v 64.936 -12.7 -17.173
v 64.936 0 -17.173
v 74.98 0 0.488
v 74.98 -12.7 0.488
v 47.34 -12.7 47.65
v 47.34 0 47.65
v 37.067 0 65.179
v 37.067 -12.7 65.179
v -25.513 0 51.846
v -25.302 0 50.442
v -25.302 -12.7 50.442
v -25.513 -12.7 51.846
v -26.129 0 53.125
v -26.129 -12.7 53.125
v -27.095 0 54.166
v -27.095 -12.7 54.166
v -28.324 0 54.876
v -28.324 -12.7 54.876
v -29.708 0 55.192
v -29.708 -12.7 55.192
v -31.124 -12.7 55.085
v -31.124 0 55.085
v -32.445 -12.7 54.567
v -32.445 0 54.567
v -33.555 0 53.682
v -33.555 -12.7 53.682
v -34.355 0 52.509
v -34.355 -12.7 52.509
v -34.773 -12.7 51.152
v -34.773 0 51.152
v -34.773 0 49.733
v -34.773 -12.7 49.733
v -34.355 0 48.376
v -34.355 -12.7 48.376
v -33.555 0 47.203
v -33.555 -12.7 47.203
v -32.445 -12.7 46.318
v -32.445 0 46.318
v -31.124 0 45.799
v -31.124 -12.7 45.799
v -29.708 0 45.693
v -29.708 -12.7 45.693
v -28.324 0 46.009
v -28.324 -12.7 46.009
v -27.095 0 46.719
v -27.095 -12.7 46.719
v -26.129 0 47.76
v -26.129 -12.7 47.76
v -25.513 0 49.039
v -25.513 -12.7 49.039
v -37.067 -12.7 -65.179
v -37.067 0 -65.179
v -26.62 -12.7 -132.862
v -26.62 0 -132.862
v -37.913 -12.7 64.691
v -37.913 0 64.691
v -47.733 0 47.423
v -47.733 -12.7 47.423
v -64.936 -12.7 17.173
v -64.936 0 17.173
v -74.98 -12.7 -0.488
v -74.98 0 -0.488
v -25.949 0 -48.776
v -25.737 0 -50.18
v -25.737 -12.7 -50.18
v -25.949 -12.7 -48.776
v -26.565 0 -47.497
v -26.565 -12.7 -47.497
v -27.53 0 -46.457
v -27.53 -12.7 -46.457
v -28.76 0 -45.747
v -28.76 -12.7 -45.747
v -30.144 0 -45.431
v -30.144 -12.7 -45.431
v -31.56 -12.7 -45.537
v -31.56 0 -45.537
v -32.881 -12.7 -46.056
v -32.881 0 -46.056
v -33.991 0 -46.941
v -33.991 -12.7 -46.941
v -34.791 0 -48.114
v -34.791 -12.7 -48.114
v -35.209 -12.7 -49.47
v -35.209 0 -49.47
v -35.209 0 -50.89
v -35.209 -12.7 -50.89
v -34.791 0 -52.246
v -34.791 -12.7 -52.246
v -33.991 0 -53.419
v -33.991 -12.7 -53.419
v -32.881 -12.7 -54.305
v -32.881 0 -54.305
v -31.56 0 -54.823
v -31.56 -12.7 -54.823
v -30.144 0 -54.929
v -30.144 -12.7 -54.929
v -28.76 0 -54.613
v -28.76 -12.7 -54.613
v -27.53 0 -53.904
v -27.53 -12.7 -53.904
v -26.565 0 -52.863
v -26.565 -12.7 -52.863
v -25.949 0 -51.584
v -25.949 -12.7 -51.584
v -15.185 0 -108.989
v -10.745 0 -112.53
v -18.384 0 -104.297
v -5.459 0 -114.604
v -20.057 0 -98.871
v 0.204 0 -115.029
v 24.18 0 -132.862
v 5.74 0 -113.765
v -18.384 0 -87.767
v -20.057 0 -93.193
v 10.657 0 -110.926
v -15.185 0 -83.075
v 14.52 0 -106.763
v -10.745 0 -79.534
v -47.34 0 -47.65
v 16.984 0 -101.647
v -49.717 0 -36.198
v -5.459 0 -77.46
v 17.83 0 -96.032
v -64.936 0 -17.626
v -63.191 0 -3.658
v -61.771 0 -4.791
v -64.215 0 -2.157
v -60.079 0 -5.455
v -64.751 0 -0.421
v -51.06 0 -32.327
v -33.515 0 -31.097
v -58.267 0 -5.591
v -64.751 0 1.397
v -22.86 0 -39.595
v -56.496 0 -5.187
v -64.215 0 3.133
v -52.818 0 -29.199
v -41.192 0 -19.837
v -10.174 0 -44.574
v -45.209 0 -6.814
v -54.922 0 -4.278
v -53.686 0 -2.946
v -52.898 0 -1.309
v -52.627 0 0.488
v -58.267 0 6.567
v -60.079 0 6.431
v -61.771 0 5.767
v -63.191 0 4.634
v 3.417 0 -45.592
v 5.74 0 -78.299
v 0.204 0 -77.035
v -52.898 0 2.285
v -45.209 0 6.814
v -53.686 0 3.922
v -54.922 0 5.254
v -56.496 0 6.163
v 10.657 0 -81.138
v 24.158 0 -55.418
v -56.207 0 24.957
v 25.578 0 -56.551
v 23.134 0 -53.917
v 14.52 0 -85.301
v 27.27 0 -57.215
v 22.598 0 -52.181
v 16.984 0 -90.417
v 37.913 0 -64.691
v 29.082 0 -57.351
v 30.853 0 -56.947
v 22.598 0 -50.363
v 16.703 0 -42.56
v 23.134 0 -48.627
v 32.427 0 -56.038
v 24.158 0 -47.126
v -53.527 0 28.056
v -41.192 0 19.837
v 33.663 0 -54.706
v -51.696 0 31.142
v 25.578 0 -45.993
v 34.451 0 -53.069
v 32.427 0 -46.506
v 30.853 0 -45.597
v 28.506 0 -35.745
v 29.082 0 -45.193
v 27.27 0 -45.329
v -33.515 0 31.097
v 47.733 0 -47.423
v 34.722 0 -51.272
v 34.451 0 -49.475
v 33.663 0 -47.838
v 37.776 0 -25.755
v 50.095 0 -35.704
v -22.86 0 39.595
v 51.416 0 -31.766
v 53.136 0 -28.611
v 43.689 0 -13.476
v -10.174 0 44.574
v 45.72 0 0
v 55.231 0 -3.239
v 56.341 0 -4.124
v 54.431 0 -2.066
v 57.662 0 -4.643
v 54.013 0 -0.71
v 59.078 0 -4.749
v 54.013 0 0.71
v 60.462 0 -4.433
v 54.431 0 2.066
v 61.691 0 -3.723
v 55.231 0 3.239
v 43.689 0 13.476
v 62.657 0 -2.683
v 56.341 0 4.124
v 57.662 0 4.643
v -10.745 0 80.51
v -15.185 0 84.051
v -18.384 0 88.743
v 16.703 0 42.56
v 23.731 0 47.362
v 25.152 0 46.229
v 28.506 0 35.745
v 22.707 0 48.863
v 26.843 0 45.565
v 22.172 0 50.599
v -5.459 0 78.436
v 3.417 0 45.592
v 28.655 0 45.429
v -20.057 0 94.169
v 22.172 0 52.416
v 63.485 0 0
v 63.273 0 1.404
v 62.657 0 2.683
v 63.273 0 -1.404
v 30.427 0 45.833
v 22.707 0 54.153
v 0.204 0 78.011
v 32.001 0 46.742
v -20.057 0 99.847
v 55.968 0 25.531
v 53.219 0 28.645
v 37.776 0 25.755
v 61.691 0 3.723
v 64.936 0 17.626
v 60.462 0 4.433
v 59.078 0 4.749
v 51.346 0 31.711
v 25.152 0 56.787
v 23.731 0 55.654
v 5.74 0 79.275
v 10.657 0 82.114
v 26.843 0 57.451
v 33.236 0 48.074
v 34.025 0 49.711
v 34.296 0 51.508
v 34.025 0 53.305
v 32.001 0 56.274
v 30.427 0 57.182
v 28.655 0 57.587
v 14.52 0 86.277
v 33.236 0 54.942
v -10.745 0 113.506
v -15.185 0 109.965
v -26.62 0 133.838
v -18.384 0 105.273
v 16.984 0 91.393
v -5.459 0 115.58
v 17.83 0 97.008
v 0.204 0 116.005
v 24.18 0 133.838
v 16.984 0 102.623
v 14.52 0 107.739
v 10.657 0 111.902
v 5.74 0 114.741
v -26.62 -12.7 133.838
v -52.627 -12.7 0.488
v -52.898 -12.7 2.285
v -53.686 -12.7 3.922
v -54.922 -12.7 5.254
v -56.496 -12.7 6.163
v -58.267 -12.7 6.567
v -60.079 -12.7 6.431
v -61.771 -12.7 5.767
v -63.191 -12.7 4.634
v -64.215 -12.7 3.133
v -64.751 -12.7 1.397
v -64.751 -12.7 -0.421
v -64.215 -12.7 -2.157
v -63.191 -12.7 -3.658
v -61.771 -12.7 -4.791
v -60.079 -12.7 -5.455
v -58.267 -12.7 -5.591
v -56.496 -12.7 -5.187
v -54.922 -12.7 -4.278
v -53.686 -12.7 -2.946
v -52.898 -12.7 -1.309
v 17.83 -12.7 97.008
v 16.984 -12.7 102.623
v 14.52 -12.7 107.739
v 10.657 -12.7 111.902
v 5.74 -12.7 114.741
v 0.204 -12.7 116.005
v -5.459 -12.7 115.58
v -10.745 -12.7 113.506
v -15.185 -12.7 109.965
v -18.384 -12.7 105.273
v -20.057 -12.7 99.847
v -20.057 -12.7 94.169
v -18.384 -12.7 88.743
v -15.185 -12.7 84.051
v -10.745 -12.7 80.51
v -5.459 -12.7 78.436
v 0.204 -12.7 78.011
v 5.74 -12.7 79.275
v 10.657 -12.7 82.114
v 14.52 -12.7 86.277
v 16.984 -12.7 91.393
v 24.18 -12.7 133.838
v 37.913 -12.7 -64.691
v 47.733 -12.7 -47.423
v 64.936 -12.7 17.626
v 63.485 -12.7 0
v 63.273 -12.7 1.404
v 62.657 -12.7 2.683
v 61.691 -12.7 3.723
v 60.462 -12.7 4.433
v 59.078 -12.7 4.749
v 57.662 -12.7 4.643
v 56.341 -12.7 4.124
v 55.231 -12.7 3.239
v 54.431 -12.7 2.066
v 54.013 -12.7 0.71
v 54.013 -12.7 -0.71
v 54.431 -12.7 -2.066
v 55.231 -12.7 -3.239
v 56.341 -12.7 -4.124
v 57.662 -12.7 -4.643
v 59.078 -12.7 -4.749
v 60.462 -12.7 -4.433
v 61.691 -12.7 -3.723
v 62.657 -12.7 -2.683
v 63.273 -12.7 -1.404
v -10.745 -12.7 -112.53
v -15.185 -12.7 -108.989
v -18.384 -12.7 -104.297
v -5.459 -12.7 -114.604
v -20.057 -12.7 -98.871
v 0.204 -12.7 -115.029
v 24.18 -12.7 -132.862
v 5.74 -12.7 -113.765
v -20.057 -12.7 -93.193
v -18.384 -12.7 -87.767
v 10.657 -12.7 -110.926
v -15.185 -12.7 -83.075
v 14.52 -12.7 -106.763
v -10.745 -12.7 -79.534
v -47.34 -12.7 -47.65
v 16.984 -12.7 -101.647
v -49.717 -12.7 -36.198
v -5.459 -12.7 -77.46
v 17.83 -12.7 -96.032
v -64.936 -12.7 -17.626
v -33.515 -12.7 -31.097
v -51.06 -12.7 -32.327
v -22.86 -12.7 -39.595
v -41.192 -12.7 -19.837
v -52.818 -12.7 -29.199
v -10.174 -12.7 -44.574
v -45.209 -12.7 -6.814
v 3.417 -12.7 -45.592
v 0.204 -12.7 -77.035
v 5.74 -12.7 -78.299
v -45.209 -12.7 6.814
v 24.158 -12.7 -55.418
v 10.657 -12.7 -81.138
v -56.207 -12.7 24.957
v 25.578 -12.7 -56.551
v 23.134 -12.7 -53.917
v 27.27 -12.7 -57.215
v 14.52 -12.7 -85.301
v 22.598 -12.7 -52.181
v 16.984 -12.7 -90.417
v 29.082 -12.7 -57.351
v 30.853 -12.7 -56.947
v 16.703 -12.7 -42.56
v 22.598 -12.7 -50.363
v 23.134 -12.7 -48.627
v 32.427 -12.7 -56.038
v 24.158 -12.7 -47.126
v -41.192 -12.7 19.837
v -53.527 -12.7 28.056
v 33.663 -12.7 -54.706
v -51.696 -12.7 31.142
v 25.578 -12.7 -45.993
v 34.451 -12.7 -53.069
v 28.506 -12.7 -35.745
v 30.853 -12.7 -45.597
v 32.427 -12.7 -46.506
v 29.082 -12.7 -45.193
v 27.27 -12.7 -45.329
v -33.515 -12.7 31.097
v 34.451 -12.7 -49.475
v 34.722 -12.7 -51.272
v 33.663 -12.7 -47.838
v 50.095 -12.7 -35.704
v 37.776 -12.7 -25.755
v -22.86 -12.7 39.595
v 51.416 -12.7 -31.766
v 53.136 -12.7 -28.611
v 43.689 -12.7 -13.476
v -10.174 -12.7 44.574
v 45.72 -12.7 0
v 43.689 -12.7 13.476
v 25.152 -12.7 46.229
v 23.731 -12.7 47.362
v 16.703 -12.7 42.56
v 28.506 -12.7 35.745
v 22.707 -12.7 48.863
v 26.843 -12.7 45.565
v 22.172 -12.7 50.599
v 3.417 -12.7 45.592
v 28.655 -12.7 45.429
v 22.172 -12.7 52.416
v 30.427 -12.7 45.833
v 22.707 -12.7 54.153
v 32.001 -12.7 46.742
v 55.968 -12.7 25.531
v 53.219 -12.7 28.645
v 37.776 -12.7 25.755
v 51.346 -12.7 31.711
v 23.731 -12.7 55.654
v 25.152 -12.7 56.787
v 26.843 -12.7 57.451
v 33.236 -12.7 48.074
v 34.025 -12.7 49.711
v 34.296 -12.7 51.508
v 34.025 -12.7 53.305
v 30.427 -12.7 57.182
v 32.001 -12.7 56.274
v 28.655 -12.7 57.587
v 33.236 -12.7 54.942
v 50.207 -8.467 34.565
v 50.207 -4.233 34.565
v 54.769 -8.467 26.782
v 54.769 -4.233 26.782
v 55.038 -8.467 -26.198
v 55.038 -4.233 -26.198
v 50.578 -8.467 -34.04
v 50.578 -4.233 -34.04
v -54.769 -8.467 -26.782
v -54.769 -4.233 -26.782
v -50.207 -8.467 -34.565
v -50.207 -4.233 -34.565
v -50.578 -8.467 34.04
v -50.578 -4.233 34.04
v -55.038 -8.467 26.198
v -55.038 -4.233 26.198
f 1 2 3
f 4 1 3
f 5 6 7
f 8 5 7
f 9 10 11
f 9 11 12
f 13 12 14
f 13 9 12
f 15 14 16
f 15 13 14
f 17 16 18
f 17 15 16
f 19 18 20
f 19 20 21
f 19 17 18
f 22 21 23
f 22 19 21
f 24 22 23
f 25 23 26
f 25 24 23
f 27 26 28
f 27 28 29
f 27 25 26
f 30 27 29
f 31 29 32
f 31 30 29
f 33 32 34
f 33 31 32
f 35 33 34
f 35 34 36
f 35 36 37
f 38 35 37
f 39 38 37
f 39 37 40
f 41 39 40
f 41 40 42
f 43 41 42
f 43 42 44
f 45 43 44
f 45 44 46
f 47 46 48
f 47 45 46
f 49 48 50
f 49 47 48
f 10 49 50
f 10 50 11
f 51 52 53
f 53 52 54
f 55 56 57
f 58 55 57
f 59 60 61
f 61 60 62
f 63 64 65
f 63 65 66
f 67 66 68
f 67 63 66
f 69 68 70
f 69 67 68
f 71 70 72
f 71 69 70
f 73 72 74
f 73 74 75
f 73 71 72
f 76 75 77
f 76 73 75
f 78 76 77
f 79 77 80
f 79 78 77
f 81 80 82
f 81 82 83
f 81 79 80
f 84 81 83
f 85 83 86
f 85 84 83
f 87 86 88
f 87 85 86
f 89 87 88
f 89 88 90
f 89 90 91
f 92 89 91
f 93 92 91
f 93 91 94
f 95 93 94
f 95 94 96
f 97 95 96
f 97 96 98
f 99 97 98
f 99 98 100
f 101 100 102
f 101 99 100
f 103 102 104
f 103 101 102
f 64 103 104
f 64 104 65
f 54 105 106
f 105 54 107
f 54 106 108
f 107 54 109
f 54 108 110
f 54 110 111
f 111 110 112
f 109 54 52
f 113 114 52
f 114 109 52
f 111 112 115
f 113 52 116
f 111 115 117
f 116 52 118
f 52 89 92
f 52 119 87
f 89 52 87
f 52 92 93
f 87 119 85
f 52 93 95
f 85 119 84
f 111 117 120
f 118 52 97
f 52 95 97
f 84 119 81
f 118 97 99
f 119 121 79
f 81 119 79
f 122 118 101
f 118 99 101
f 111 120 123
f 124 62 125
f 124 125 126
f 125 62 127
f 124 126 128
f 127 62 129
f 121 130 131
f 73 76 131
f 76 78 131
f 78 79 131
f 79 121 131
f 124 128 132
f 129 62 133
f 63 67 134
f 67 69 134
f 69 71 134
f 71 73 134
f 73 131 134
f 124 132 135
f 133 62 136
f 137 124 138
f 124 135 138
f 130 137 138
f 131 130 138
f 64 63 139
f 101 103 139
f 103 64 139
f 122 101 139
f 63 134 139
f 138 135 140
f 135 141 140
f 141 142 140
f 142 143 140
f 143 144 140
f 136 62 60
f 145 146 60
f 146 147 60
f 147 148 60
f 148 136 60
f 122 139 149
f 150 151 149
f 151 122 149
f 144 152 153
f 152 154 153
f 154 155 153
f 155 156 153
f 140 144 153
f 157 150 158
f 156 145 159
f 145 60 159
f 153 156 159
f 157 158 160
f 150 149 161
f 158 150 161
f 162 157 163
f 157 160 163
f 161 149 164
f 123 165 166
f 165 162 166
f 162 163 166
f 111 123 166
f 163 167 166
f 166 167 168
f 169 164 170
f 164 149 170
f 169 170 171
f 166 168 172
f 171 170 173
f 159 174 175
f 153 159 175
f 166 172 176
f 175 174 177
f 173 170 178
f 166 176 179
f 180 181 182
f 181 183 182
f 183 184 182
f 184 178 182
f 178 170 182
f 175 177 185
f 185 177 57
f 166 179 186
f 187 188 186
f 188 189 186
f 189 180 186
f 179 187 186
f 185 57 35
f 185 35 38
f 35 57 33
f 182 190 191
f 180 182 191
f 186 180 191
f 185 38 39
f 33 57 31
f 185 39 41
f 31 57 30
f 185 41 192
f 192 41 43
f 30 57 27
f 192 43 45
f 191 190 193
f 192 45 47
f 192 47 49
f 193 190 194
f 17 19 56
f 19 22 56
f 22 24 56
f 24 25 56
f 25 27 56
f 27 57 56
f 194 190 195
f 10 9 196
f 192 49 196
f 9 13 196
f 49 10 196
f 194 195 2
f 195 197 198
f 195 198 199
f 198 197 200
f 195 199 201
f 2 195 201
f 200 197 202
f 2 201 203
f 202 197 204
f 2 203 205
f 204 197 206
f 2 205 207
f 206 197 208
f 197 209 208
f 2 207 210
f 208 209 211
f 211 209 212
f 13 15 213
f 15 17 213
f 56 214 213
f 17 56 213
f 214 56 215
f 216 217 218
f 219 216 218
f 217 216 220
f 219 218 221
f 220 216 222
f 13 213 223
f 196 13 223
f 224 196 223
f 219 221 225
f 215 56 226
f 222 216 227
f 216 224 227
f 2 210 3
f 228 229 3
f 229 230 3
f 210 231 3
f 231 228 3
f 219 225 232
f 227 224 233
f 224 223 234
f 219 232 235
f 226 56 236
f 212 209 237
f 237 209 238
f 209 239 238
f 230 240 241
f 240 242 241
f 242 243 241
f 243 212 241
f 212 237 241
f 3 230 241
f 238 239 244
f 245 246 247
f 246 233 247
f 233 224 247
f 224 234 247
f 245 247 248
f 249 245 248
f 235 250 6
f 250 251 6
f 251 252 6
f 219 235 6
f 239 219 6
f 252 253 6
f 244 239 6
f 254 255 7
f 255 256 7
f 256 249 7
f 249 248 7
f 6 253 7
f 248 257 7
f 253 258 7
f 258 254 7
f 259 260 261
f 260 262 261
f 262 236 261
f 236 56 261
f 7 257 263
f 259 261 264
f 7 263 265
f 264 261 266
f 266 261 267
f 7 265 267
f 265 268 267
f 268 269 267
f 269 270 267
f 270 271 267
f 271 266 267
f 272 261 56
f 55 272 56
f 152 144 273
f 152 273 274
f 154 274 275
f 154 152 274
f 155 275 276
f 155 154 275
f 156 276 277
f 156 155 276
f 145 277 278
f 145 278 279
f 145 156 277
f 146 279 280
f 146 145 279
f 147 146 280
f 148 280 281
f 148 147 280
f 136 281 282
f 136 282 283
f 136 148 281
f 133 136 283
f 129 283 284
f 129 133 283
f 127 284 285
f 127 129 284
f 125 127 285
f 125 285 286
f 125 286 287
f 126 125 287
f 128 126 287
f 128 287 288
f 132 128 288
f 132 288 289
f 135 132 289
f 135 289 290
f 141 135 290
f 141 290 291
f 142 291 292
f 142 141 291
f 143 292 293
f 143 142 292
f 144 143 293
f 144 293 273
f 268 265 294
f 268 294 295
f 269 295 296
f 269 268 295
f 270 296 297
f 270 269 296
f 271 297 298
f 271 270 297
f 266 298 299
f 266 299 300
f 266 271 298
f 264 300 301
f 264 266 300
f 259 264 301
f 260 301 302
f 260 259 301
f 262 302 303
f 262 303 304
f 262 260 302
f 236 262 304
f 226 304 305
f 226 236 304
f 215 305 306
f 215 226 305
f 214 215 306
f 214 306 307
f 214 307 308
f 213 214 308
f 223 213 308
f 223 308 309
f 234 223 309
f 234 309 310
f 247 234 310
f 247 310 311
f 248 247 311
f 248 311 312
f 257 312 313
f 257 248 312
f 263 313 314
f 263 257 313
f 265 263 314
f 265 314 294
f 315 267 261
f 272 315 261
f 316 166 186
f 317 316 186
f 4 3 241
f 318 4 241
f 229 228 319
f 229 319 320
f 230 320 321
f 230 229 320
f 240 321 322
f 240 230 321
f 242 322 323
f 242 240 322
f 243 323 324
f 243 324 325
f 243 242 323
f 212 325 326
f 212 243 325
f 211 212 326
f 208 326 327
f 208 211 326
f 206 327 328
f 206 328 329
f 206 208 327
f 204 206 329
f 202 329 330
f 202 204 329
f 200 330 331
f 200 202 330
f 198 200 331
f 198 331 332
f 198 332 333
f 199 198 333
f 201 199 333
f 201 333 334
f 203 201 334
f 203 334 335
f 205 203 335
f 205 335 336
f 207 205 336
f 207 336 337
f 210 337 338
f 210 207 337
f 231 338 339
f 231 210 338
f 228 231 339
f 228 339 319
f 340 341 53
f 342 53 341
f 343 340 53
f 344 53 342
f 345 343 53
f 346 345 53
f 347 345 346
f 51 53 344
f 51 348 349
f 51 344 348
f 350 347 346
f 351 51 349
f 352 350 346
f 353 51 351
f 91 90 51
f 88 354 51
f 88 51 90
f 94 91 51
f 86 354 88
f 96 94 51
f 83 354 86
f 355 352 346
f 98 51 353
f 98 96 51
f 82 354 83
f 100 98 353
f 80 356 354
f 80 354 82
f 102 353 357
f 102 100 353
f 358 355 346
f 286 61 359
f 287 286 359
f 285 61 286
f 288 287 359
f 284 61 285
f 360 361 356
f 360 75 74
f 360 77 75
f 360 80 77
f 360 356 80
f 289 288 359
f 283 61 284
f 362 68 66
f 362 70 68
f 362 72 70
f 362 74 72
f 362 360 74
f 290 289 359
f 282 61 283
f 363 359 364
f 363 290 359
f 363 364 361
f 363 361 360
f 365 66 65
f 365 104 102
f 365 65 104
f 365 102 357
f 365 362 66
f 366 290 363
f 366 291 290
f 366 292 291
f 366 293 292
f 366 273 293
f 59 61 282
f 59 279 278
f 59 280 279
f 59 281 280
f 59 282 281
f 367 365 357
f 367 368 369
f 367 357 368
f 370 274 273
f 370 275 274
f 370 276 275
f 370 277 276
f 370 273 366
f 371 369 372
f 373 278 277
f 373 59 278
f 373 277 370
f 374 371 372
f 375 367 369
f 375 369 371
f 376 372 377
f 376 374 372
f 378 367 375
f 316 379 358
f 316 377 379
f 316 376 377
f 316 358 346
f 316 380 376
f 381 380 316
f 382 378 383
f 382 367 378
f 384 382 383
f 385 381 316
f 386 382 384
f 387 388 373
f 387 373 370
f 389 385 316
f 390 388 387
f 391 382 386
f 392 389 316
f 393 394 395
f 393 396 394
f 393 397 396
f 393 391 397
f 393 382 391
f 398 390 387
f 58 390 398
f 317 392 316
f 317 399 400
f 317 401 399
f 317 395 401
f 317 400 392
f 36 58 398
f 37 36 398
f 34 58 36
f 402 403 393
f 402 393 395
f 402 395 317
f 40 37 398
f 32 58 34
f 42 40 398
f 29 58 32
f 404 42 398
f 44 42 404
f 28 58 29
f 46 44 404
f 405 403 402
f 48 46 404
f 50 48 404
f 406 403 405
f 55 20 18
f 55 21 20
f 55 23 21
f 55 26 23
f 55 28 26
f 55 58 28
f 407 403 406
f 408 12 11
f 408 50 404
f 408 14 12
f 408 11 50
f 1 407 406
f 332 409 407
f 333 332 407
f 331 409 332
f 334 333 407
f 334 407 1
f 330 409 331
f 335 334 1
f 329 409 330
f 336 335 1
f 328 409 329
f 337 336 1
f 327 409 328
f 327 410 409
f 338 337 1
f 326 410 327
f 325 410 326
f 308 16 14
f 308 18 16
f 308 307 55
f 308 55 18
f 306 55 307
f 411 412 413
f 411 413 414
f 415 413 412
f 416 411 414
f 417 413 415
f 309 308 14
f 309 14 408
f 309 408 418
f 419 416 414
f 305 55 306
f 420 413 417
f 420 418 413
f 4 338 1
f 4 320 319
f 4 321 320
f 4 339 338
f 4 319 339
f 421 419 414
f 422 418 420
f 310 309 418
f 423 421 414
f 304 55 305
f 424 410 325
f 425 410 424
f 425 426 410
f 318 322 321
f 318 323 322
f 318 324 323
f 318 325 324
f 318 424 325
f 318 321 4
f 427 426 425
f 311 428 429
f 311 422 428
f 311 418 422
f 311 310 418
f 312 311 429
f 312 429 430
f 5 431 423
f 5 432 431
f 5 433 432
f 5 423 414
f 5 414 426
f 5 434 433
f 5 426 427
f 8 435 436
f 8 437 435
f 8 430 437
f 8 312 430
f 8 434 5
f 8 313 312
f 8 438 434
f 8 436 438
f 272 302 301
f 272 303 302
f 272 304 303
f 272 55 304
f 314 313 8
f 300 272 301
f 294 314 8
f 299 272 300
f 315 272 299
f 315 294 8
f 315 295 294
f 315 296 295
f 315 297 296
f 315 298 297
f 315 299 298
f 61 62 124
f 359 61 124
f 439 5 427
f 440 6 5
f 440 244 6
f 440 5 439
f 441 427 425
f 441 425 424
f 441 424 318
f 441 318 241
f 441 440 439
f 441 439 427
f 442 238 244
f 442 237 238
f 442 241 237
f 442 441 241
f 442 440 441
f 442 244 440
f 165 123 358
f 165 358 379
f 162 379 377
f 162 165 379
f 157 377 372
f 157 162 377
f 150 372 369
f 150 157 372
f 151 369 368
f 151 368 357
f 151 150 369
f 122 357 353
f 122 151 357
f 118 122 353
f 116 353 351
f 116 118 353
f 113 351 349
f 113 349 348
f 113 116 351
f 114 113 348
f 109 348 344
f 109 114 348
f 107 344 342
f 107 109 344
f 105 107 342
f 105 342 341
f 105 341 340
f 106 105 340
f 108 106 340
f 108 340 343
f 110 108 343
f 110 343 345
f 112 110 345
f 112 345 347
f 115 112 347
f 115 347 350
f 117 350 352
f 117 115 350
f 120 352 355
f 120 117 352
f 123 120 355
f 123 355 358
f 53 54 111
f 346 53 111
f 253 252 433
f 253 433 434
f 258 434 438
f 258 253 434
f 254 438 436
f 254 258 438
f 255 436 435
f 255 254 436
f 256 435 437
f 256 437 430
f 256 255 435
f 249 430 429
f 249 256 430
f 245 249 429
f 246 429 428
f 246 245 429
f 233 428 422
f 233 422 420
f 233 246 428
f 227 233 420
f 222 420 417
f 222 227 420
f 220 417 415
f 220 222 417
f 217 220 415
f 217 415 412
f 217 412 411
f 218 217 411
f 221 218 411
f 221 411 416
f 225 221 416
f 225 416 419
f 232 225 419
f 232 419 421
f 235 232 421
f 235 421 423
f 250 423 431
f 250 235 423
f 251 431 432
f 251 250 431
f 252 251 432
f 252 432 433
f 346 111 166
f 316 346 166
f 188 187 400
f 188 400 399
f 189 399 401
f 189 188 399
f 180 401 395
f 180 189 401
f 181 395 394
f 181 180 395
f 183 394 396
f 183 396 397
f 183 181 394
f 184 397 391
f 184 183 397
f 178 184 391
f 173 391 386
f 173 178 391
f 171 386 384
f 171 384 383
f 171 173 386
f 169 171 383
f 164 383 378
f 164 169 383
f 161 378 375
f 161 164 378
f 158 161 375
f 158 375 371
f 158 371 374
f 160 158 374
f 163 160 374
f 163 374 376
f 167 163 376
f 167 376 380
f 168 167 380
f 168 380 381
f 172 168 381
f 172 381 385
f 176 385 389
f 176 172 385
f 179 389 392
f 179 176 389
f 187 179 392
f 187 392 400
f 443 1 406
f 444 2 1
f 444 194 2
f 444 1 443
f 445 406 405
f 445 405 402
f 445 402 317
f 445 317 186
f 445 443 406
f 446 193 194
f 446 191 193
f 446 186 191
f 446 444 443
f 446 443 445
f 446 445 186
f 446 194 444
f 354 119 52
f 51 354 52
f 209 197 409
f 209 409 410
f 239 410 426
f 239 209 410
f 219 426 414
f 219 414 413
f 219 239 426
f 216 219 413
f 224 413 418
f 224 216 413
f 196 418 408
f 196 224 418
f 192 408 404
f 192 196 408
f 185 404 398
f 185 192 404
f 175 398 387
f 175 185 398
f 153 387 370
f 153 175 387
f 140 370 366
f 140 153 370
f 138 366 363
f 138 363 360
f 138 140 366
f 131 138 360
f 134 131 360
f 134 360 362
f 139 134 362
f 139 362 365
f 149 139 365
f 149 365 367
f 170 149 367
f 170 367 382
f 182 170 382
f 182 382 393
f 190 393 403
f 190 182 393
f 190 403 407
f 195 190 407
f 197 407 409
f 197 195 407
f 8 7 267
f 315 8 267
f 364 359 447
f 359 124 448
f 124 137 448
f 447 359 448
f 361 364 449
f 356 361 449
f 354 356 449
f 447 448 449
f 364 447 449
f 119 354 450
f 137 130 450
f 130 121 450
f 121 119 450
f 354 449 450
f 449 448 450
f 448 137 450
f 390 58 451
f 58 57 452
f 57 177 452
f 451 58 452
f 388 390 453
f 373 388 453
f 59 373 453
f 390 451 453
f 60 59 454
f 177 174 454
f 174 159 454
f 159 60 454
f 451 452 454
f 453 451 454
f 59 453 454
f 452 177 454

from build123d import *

# Parameters (mm, degrees)
F0_R     = 19.05
F0_R_2   = 4.7625
F0_R_3   = 6.096
F0_R_4   = 45.72
F1_DEPTH = 12.7


# Not quite as in the source:
# - ends of sketch curves that miss each other by under 0.0002 mm in the source are joined


with BuildPart() as f1:
    # F0 (on Front) → F1 (new body)
    with BuildSketch(Plane.XZ):
        with BuildLine():
            Line((37.0673326191, 65.1785315794), (24.1799304387, 133.8380140911))
            Line((24.1799304387, 133.8380140911), (-26.6200695613, 133.8380140911))
            Line((-26.6200695613, 133.8380140911), (-37.9125978196, 64.6905174884))
            Line((-37.9125978196, 64.6905174884), (-47.7326956793, 47.4230339812))
            add(Edge.make_bspline(
                [(-47.7326956793, 47.4230339812), (-51.0448461758, 29.0294404336), (-51.0448462531, 29.0294404776), (-64.9358999582, 17.1732288977)],
                knots=[0, 0, 0, 0, 34.7994388611, 34.7994388611, 34.7994388611, 34.7994388611], degree=3))
            Line((-64.9358999582, 17.1732288977), (-74.9799305502, -0.4880138996))
            Line((-74.9799305502, -0.4880138996), (-64.9359000035, -17.6262099378))
            add(Edge.make_bspline(
                [(-64.9359000035, -17.6262099378), (-50.6626559715, -29.6914131837), (-50.6626551721, -29.6914132451), (-47.3404022927, -47.649524558)],
                knots=[0, 0, 0, 0, 34.7994390827, 34.7994390827, 34.7994390827, 34.7994390827], degree=3))
            Line((-47.3404022927, -47.649524558), (-37.0673327313, -65.1785313884))
            Line((-37.0673327313, -65.1785313884), (-26.6200695613, -132.8619859089))
            Line((-26.6200695613, -132.8619859089), (24.1799304387, -132.8619859089))
            Line((24.1799304387, -132.8619859089), (37.9125978196, -64.6905174884))
            Line((37.9125978196, -64.6905174884), (47.7326956902, -47.4230338593))
            add(Edge.make_bspline(
                [(64.9358998918, -17.1732287319), (51.0448461867, -29.0294403117), (51.0448461867, -29.0294403117), (47.7326956902, -47.4230338593)],
                knots=[0, 0, 0, 0, 34.7994388611, 34.7994388611, 34.7994388611, 34.7994388611], degree=3))
            Line((64.9358998918, -17.1732287319), (74.9799304387, 0.4880140911))
            Line((74.9799304387, 0.4880140911), (64.9358998918, 17.6262101292))
            add(Edge.make_bspline(
                [(47.3404022927, 47.649524558), (50.662655861, 29.6914133741), (50.662655861, 29.6914133741), (64.9358998918, 17.6262101292)],
                knots=[0, 0, 0, 0, 34.7994388611, 34.7994388611, 34.7994388611, 34.7994388611], degree=3))
            Line((47.3404022927, 47.649524558), (37.0673326191, 65.1785315794))
        make_face()
        with Locations((-1.2200695613, -96.0319859089)):
            Circle(F0_R, mode=Mode.SUBTRACT)
        with Locations((-30.4998691349, -50.180102728)):
            Circle(F0_R_2, mode=Mode.SUBTRACT)
        with Locations((28.6262483892, -51.2720453093)):
            Circle(F0_R_3, mode=Mode.SUBTRACT)
        Circle(F0_R_4, mode=Mode.SUBTRACT)
        with Locations((58.7220974339, 0)):
            Circle(F0_R_2, mode=Mode.SUBTRACT)
        with Locations((-58.7227720341, 0.4880365509)):
            Circle(F0_R_3, mode=Mode.SUBTRACT)
        with Locations((-30.0641650228, 50.4423503469)):
            Circle(F0_R_2, mode=Mode.SUBTRACT)
        with Locations((-1.2200695613, 97.0080140911)):
            Circle(F0_R, mode=Mode.SUBTRACT)
        with Locations((28.1997188878, 51.5078691239)):
            Circle(F0_R_3, mode=Mode.SUBTRACT)
    extrude(amount=F1_DEPTH)


solid = f1.part
